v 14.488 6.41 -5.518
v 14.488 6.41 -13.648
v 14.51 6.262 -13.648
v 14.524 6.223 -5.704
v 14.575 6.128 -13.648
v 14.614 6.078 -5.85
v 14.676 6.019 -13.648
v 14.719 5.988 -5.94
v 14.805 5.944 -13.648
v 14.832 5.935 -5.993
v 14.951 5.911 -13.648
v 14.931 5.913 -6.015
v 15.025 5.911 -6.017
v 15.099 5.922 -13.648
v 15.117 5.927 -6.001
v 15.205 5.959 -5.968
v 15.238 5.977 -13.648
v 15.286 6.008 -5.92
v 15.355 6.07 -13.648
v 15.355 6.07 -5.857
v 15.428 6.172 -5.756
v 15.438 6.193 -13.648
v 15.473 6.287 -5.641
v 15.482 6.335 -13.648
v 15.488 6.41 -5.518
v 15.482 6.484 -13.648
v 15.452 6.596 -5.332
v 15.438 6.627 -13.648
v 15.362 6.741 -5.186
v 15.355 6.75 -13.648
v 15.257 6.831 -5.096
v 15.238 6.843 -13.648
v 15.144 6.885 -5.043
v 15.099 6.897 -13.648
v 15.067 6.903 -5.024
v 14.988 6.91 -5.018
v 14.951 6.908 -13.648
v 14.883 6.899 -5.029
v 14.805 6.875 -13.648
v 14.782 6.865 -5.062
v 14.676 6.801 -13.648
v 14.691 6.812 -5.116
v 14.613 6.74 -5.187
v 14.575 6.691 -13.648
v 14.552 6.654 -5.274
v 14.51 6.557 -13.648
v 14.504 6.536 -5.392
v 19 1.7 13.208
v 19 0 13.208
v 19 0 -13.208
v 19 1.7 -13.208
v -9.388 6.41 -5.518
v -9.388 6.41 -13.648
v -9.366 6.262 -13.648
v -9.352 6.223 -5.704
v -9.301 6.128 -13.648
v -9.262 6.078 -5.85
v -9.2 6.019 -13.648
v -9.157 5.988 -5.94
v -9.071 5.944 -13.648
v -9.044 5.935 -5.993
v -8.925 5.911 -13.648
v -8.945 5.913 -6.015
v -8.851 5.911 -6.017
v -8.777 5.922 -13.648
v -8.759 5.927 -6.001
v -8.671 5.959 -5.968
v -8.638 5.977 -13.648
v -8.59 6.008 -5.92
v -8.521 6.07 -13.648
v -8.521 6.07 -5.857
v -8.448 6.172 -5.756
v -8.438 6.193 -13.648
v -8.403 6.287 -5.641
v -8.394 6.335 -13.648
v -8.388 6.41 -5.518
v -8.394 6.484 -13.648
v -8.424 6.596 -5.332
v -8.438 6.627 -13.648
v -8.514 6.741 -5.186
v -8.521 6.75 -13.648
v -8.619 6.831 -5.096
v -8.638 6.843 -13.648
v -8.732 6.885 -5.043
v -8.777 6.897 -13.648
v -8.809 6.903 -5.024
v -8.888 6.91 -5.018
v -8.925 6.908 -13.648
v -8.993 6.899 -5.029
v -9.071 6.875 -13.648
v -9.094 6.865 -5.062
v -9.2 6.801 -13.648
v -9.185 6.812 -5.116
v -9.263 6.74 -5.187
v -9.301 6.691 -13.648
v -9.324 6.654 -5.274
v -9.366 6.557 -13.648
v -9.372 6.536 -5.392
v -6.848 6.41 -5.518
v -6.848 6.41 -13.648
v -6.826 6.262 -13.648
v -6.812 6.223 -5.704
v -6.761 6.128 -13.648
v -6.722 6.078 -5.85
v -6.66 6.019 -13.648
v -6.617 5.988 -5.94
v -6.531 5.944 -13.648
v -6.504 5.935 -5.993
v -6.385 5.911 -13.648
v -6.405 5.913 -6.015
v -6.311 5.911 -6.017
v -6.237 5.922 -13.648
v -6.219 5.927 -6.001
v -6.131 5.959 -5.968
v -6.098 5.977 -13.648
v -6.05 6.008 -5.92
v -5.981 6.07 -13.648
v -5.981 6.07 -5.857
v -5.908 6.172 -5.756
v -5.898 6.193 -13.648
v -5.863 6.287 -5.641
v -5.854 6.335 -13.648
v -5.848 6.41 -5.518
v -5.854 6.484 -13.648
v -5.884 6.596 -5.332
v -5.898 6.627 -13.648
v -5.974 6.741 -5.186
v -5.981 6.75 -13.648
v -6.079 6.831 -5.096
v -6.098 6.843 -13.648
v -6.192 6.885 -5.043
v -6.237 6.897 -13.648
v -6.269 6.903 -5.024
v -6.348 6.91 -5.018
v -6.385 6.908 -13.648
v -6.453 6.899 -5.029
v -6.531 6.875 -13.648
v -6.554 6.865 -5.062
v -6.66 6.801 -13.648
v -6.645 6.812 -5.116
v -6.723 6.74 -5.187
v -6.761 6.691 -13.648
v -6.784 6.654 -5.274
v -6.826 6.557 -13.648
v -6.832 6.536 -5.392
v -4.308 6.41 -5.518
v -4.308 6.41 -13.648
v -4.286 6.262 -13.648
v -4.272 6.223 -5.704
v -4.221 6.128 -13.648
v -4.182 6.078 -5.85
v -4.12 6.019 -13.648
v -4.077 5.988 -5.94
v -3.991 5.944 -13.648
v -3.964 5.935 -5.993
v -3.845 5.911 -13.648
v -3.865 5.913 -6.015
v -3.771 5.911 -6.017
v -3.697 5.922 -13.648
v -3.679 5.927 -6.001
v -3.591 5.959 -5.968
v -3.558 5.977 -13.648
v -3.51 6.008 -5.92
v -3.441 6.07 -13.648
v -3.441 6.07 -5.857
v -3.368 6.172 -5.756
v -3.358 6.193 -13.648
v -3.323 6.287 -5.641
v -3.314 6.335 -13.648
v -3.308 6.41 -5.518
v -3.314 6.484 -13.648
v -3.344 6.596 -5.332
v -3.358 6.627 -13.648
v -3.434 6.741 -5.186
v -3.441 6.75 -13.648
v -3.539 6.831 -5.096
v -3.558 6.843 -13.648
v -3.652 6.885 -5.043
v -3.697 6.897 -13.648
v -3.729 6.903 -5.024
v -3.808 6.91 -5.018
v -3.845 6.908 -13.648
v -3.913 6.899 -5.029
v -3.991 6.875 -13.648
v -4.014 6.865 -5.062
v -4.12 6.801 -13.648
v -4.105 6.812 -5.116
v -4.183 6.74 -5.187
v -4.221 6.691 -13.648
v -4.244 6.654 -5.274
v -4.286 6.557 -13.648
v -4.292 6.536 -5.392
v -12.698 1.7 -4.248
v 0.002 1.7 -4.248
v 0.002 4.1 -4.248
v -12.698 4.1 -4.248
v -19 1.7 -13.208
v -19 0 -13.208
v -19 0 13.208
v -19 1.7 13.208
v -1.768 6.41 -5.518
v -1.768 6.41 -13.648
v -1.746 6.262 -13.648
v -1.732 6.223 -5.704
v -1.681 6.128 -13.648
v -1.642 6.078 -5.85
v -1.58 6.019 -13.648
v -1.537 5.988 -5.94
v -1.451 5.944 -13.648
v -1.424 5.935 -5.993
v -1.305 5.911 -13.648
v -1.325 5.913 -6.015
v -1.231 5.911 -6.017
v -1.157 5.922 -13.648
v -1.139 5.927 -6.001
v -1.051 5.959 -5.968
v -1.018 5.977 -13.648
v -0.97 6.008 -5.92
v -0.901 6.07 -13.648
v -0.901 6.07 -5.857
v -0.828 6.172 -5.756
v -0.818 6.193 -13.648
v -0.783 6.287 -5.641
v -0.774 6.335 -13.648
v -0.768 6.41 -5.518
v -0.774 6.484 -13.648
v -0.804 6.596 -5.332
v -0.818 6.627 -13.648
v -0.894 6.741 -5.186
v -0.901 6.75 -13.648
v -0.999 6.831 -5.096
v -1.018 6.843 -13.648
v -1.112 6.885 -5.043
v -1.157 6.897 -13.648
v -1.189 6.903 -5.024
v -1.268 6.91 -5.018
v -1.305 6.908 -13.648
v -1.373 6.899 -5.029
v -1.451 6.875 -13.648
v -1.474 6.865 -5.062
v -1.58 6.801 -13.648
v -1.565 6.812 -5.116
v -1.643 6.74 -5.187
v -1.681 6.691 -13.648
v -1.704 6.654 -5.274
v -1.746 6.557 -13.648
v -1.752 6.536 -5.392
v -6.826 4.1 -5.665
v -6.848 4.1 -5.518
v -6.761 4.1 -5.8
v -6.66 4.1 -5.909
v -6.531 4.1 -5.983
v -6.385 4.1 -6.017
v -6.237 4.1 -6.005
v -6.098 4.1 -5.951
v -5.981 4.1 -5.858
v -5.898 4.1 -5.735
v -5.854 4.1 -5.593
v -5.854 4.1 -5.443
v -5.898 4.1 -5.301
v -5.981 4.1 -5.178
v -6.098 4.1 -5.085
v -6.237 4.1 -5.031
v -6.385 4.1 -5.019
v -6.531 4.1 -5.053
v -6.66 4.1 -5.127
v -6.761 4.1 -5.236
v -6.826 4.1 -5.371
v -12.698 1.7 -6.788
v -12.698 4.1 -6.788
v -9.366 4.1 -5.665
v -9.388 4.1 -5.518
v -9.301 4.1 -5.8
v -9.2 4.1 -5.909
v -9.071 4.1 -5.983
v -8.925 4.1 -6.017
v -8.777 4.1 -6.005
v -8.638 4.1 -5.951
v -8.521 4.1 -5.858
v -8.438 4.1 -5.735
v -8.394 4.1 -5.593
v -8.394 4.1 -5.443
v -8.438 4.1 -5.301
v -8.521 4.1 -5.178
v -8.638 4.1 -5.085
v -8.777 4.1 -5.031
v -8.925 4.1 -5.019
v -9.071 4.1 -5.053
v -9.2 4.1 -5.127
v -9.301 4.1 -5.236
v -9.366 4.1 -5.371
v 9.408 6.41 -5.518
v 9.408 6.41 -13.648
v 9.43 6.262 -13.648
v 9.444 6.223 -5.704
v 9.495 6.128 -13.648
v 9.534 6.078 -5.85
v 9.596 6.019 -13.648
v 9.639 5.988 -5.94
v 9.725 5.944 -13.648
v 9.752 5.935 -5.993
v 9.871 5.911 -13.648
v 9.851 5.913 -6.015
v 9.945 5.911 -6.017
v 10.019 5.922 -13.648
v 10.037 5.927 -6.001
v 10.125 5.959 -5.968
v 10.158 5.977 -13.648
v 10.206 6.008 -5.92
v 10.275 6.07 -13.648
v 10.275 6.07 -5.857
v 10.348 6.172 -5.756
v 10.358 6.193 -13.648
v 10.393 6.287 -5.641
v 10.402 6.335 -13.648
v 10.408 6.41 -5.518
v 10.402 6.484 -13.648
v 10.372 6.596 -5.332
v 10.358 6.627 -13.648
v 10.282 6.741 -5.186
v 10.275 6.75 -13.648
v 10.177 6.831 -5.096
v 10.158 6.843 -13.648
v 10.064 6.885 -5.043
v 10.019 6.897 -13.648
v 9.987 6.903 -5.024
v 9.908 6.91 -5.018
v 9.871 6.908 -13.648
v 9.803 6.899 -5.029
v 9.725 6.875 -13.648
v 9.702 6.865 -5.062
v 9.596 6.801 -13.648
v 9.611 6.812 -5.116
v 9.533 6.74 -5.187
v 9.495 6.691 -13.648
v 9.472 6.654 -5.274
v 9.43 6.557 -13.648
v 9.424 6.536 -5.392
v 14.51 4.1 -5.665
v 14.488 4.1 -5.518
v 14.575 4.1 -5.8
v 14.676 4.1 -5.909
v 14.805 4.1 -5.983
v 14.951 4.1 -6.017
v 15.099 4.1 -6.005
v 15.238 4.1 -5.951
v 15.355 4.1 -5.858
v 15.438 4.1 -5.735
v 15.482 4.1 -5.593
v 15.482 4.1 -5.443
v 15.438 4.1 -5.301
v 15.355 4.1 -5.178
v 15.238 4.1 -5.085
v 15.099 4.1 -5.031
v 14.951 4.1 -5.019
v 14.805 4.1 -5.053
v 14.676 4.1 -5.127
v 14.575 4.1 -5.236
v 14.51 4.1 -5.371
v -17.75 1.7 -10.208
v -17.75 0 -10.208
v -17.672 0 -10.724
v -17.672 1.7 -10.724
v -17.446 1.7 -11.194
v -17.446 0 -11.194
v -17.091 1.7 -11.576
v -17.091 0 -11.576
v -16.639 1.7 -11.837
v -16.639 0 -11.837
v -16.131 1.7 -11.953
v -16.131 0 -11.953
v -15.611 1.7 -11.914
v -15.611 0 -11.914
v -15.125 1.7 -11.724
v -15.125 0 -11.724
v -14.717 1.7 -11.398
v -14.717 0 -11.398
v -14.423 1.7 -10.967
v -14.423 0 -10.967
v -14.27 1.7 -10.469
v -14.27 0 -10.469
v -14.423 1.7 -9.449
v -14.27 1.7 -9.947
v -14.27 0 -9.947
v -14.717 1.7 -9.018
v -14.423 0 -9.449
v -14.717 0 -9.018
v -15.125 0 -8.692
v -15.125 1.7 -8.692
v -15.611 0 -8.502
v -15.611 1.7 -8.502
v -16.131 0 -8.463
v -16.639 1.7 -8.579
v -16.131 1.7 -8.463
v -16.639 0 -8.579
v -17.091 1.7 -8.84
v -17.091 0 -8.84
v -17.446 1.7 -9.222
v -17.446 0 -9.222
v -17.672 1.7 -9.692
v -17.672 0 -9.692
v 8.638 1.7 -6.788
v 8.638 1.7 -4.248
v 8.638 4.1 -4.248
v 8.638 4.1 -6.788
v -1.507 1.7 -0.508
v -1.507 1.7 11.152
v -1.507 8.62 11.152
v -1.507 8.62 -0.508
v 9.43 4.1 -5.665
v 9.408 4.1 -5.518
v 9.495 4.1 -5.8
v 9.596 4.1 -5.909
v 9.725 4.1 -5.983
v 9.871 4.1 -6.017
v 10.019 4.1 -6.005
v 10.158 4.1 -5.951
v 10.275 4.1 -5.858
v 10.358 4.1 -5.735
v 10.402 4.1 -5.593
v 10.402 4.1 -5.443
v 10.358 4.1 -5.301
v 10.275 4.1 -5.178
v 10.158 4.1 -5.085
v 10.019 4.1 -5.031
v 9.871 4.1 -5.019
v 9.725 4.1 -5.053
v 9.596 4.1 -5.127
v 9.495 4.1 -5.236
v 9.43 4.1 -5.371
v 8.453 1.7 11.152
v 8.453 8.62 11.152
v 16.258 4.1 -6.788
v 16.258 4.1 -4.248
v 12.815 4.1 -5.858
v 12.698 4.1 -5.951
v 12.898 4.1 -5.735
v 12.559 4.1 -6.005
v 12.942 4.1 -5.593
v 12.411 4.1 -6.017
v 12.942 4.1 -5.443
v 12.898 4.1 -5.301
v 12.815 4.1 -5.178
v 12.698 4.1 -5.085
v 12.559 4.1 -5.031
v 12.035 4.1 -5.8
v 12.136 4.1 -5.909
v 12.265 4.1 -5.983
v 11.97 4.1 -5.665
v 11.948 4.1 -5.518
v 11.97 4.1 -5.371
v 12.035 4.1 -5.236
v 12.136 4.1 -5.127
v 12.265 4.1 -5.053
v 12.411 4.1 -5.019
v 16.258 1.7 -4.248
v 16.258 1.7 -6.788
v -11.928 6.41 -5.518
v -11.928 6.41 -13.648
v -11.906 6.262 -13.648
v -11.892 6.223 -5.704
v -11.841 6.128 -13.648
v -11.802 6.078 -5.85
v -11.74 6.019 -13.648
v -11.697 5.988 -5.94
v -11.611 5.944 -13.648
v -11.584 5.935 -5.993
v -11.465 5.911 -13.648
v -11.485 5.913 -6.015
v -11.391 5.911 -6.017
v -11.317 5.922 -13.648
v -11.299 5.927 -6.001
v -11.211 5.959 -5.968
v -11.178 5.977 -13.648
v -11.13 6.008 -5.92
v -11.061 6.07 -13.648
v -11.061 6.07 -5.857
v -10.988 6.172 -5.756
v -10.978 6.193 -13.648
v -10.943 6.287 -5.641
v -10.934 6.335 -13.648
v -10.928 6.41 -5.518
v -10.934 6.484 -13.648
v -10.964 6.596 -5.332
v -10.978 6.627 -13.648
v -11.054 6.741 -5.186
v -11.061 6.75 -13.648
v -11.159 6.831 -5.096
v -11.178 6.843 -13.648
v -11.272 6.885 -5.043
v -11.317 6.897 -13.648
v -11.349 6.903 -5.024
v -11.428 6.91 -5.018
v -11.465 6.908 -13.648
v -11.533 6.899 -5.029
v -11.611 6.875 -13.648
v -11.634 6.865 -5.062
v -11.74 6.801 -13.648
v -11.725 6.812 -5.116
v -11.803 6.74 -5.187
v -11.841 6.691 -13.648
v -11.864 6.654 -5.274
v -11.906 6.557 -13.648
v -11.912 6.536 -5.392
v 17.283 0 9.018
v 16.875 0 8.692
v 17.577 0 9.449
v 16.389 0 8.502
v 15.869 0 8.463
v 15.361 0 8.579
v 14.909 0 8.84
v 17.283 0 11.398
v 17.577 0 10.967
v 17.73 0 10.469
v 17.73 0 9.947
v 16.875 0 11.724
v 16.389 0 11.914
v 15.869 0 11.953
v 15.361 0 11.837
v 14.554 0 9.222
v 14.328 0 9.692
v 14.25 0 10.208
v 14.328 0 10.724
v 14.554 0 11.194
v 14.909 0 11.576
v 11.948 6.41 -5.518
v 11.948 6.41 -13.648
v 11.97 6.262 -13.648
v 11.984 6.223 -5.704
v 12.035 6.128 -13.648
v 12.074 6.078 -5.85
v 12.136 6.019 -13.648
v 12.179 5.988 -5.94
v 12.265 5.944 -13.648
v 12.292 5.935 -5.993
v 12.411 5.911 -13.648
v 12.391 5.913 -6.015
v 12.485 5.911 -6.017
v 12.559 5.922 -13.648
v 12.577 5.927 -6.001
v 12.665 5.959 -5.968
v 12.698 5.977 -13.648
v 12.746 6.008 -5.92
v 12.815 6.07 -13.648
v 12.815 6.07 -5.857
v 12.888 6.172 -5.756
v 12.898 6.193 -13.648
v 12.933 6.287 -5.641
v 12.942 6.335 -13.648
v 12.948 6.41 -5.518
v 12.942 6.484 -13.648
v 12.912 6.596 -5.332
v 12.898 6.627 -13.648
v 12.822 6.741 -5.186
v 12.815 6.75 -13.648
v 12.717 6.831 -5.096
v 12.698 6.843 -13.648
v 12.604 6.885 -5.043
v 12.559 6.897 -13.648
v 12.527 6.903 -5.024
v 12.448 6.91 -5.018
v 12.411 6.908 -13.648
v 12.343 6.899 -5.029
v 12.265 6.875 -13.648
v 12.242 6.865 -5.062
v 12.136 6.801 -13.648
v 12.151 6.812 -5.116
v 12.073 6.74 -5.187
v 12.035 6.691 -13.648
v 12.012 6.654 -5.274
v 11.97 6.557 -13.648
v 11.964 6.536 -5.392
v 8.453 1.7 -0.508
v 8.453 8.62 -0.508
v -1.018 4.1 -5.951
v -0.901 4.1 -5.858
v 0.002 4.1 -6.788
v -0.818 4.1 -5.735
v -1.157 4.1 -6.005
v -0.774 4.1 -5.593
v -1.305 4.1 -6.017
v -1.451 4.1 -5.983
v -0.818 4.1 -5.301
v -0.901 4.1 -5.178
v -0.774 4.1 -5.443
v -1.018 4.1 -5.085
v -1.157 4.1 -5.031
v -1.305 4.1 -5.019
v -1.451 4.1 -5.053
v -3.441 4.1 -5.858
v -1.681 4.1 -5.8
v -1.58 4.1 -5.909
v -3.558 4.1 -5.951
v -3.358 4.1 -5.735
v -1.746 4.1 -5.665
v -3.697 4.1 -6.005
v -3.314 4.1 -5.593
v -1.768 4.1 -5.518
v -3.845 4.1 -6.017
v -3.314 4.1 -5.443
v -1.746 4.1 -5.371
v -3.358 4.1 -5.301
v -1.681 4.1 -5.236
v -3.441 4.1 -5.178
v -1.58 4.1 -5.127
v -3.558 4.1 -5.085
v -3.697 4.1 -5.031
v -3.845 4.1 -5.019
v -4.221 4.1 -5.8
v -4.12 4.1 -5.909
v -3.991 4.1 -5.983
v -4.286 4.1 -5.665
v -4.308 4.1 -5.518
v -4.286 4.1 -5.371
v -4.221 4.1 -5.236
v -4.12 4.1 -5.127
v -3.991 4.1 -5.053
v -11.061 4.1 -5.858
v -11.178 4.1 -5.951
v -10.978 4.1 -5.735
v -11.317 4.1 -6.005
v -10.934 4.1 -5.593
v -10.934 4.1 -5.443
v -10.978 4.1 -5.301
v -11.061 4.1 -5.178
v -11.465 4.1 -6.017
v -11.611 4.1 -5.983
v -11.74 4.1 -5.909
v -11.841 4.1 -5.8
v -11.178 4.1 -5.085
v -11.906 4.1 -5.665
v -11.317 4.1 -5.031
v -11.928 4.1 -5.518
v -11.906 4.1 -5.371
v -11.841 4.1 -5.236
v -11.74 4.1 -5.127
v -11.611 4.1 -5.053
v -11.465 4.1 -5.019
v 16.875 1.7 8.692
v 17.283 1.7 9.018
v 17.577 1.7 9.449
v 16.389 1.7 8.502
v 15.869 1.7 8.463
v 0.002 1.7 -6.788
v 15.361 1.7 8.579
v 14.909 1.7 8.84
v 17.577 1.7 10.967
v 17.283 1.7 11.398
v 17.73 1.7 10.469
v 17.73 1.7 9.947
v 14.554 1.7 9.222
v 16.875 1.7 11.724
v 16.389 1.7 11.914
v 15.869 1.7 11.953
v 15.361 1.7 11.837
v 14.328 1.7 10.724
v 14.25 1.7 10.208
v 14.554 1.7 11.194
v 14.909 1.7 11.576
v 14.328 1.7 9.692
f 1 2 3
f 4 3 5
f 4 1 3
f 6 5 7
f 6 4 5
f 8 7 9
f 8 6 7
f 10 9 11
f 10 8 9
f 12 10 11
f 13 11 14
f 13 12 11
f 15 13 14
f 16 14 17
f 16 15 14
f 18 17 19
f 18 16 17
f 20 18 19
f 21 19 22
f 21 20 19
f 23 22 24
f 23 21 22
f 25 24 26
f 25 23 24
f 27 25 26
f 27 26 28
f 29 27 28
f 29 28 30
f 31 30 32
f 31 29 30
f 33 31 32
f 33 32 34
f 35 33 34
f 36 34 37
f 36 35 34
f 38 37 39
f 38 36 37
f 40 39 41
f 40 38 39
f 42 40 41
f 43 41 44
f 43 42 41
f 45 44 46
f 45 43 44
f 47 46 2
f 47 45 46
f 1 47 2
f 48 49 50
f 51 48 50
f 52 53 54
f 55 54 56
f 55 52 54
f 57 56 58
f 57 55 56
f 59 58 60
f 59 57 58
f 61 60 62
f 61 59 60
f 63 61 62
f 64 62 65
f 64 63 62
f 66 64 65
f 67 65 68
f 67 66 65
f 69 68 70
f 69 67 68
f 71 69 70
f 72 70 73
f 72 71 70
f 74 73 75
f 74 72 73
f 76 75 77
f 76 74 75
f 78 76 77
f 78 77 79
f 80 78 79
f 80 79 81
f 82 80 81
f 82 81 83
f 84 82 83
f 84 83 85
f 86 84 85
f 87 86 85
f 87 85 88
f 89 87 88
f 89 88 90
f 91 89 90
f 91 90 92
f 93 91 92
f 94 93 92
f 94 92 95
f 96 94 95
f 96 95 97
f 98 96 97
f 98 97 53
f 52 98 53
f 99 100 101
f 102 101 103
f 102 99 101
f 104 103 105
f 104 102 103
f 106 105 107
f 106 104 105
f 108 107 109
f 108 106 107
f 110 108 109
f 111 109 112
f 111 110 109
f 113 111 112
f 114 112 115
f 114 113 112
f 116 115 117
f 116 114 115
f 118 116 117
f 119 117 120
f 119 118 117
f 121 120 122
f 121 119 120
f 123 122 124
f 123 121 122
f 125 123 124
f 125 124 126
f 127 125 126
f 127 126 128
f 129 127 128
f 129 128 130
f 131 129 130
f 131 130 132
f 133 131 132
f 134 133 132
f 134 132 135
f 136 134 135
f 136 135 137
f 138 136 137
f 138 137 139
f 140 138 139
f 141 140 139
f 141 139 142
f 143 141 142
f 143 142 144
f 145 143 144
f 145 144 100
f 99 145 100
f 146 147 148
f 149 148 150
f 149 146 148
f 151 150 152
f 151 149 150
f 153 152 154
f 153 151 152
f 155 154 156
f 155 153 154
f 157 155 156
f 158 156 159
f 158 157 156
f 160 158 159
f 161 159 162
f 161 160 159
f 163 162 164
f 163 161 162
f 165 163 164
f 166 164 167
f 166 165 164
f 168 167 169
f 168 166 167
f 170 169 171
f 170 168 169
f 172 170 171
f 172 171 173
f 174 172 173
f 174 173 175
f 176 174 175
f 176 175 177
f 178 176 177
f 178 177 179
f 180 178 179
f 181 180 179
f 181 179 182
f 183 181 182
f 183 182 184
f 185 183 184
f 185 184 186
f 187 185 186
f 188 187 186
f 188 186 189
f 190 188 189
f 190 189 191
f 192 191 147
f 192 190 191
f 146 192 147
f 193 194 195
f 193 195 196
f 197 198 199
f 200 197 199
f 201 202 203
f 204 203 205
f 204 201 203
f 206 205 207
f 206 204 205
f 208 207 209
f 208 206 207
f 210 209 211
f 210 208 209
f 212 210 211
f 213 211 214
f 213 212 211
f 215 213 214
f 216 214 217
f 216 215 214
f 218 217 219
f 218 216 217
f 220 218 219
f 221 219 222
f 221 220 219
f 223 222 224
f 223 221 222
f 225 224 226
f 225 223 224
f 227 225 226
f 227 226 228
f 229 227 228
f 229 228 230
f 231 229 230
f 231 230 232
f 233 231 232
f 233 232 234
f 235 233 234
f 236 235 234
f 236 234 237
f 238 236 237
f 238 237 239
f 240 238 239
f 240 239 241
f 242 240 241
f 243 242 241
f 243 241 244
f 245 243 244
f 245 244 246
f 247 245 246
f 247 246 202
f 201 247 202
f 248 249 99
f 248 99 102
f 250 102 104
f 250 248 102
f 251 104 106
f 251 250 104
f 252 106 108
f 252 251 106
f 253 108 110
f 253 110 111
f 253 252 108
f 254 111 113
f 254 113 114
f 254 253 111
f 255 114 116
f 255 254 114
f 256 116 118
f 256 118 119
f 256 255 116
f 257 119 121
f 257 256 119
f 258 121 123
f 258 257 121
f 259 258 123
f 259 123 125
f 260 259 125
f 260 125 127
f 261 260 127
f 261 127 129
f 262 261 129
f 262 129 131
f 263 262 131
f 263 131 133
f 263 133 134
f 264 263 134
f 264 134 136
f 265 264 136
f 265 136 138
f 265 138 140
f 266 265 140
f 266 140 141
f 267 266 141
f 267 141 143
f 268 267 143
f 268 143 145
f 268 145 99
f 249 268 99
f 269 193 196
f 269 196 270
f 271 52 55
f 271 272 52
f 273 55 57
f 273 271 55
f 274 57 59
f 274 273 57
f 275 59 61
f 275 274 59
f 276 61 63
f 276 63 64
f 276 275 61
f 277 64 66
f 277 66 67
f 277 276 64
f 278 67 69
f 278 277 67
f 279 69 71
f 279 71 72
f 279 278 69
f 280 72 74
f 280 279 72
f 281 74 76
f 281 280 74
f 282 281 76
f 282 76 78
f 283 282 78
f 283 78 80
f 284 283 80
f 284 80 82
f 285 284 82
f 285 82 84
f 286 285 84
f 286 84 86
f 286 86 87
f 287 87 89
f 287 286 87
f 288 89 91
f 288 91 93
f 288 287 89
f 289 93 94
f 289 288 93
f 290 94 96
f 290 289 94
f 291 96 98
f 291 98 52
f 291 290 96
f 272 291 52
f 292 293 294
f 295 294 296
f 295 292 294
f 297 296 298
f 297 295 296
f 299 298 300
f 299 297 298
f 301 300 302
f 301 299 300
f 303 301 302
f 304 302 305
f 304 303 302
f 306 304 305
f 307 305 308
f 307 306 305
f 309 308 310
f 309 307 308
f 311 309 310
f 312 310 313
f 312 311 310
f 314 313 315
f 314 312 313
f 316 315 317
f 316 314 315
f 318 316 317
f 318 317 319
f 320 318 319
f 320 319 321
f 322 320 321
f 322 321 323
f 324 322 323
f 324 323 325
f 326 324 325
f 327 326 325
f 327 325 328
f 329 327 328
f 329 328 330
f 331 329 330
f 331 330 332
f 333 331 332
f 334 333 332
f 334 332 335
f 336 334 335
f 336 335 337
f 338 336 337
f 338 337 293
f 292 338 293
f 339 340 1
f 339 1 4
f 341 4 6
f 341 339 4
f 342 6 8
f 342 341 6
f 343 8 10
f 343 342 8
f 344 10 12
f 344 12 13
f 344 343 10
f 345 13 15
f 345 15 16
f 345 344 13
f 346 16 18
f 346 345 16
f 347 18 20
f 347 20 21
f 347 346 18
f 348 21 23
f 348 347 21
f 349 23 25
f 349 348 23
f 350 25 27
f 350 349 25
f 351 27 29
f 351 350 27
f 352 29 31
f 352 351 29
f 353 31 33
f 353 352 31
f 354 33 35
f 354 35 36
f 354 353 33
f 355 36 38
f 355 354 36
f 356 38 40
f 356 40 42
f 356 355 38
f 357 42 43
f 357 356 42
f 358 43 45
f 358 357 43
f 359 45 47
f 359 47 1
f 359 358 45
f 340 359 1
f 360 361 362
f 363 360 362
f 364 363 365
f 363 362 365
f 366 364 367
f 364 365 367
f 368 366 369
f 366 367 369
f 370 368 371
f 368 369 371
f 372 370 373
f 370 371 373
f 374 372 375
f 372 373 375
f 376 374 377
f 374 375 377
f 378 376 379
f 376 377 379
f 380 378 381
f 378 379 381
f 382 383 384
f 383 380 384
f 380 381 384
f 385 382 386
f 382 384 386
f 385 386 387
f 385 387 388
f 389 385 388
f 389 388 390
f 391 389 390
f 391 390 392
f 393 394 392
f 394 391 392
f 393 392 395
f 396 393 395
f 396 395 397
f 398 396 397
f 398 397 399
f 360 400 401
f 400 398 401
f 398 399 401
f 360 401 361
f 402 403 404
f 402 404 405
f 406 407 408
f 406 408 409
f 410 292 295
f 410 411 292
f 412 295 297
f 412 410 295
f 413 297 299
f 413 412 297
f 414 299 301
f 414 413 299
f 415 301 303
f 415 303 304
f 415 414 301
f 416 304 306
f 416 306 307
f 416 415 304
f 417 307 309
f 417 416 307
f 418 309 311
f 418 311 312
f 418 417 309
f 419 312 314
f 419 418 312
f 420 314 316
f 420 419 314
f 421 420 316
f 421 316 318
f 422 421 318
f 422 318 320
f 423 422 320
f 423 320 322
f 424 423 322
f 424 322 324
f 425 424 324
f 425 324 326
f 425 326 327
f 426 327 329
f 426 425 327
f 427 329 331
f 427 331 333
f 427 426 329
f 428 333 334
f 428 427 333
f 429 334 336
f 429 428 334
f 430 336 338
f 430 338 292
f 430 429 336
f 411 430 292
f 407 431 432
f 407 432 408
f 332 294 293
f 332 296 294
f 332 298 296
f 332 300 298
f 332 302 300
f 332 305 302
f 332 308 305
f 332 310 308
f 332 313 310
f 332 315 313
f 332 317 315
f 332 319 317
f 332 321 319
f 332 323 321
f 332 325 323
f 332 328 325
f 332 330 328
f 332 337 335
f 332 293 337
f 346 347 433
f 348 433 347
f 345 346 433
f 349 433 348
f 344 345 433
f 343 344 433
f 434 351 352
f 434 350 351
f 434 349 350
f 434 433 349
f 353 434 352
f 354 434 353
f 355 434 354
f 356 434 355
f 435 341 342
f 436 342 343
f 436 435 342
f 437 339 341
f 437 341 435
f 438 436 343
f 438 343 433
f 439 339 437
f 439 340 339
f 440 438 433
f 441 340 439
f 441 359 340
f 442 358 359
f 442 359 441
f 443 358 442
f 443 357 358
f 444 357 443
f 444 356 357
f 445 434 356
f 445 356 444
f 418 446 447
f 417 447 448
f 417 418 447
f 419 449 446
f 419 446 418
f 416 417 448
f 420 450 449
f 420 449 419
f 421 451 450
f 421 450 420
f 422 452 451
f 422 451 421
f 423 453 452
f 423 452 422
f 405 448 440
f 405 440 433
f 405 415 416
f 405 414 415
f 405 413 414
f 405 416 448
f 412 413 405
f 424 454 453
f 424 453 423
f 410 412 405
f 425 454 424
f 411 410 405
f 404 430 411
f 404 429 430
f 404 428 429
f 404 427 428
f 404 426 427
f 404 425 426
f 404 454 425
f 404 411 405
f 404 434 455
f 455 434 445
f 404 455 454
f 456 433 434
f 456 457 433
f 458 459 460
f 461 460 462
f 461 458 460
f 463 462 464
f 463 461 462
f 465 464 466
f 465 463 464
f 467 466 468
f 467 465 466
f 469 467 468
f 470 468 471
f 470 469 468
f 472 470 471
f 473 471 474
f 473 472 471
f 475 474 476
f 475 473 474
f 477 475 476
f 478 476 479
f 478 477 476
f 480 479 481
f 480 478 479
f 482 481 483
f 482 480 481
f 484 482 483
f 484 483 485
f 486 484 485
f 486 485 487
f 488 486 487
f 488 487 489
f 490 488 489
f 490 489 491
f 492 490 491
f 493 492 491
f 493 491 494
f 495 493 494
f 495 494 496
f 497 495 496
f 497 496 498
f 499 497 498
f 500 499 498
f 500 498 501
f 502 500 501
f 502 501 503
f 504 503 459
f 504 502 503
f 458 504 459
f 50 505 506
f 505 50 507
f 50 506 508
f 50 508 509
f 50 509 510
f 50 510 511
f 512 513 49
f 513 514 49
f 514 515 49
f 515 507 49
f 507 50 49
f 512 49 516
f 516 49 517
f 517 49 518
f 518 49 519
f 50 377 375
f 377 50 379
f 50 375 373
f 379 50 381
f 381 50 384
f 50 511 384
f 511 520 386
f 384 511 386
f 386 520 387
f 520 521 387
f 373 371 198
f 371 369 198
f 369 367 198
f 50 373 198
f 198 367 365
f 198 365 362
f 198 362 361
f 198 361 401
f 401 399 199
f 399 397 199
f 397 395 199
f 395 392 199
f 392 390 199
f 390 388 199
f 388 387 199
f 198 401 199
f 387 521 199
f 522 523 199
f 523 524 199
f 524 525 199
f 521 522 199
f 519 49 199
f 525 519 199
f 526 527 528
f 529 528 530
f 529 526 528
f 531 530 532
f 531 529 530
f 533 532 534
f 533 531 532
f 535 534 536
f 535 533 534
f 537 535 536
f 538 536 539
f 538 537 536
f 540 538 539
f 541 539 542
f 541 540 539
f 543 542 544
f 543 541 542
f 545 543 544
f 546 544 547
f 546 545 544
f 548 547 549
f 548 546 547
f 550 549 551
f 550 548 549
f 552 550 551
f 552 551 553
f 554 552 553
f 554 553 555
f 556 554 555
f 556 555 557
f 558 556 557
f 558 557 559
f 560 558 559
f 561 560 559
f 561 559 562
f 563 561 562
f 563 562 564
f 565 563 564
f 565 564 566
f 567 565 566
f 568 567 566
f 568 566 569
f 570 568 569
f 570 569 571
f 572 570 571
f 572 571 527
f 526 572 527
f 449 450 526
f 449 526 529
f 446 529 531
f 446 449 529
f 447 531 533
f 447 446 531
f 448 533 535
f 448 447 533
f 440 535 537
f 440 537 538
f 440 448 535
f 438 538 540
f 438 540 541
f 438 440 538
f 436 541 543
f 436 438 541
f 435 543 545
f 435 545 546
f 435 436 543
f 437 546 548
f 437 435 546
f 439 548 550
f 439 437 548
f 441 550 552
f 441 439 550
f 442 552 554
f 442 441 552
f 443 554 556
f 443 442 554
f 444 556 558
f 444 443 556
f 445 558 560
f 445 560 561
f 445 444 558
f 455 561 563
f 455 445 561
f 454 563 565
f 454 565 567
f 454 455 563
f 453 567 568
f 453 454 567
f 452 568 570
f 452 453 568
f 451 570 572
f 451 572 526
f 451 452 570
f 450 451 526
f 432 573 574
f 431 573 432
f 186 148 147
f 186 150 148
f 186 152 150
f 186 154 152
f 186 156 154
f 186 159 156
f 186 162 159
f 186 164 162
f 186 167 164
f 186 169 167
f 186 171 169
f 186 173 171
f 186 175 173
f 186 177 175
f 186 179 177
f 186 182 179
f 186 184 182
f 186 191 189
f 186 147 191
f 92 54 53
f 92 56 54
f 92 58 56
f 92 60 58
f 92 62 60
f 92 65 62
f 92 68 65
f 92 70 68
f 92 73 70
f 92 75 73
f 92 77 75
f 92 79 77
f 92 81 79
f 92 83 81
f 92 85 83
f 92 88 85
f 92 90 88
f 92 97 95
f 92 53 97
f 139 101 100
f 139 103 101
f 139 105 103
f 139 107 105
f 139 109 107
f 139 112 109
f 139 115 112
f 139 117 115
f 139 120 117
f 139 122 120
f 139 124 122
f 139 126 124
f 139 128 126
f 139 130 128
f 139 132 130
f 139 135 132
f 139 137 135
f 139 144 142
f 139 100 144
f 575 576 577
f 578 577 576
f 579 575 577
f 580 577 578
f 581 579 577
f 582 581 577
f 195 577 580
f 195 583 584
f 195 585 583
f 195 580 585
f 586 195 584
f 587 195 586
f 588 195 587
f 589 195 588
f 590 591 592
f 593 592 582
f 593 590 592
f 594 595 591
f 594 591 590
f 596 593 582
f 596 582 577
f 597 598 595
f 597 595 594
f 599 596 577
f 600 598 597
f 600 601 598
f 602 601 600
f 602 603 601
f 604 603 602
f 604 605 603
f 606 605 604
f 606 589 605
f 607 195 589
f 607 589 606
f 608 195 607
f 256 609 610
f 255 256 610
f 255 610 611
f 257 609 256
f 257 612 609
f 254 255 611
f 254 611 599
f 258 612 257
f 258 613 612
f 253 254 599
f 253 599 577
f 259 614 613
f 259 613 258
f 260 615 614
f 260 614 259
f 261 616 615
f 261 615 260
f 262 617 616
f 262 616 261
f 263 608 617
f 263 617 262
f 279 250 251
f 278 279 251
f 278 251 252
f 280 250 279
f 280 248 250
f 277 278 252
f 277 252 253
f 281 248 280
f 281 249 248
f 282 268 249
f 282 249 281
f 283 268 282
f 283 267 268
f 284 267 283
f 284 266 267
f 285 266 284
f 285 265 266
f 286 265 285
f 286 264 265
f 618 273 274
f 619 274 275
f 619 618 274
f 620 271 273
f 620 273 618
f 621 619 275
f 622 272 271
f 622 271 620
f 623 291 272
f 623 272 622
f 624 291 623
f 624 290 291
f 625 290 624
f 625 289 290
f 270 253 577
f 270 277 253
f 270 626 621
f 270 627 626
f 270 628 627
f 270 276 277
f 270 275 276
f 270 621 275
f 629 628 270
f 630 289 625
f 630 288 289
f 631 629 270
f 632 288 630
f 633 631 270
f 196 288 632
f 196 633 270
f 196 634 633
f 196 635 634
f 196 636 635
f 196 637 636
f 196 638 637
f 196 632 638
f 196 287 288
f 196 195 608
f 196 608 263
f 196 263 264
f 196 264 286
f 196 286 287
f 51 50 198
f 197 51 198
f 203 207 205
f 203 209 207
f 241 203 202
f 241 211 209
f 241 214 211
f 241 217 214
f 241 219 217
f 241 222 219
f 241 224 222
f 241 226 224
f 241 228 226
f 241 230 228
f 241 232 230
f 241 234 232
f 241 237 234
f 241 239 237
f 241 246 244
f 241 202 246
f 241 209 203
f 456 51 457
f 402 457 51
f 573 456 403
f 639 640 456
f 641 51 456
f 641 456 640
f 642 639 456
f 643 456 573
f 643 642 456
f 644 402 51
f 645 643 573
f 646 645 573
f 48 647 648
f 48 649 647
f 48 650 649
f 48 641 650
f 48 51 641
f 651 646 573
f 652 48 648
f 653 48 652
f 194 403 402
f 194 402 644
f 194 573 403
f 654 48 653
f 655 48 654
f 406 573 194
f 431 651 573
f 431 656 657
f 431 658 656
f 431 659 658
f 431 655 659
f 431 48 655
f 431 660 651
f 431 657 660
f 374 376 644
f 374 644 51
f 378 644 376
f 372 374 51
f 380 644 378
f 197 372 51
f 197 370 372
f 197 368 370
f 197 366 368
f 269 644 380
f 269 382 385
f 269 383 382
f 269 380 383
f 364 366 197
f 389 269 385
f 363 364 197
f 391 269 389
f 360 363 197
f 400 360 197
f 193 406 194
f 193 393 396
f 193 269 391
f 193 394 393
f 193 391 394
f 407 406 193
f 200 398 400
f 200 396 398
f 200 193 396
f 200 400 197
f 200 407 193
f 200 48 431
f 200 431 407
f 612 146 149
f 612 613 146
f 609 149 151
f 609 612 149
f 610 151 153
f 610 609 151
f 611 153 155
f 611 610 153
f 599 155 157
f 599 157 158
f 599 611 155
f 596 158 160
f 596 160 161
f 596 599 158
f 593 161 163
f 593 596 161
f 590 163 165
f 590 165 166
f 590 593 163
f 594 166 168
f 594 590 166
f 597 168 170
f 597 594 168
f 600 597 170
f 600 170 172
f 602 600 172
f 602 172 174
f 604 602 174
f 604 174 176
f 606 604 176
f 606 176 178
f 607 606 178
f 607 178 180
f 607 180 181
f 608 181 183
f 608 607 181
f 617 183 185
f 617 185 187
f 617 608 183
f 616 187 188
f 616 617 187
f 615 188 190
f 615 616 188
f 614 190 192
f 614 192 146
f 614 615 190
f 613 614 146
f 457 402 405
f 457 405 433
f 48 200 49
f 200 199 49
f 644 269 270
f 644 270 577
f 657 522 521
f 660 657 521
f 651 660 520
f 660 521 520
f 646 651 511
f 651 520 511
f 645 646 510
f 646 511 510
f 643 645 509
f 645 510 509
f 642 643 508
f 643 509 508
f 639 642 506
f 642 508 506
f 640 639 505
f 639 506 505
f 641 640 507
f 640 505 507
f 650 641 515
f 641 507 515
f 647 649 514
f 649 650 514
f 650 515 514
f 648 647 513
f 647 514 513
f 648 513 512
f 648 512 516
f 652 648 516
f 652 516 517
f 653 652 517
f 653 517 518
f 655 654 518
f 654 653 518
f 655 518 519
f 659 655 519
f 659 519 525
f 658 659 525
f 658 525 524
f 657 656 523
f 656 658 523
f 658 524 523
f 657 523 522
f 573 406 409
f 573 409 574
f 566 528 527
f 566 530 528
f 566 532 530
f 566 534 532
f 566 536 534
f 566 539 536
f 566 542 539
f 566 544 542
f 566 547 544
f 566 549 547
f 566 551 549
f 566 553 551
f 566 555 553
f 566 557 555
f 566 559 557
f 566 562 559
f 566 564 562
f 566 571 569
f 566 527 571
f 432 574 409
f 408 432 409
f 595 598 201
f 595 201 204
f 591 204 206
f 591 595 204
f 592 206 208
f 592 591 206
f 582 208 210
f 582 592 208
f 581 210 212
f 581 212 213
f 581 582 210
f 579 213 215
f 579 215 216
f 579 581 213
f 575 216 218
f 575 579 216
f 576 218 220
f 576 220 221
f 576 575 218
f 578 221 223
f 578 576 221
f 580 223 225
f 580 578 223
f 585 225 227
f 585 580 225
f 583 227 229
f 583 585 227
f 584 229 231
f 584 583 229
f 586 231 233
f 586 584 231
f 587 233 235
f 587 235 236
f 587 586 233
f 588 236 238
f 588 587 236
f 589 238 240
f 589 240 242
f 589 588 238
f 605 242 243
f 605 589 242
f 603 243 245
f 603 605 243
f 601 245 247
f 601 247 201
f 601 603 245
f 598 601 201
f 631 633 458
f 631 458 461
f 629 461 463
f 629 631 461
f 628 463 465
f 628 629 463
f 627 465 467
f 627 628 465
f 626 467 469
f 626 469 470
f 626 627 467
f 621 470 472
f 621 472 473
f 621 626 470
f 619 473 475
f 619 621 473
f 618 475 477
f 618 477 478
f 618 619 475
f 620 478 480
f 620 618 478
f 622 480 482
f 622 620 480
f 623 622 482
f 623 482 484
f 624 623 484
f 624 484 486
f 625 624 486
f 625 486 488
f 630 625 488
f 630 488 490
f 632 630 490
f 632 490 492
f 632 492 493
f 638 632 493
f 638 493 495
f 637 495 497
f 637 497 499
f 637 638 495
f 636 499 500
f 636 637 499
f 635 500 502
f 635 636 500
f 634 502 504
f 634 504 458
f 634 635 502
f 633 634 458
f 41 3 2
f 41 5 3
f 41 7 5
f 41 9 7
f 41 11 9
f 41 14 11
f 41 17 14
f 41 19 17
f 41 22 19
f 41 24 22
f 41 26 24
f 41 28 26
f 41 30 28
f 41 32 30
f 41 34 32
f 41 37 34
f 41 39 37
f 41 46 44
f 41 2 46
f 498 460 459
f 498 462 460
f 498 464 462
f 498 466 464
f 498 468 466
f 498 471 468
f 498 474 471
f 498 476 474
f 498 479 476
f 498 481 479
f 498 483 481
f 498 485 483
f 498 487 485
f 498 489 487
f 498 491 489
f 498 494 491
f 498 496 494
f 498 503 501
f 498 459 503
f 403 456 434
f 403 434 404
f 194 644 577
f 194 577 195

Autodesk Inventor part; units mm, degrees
ref_plane "YZ Plane" through (0, 0, 0) normal (1, 0, 0) x (0, 1, 0)
ref_plane "XZ Plane" through (0, 0, 0) normal (0, 1, 0) x (-1, 0, 0)
ref_plane "XY Plane" through (0, 0, 0) normal (0, 0, 1) x (1, 0, 0)
sketch "Sketch1" plane through (0, 0, 0) normal (0, 1, 0) x (-1, 0, 0)
  line L0 (19, 13.208) -> (-19, 13.208)
  line L1 (-19, 13.208) -> (-19, -13.208)
  line L2 (-19, -13.208) -> (19, -13.208)
  line L3 (19, -13.208) -> (19, 13.208)
  line L4 (19, 13.208) -> (-19, -13.208) construction
  line L5 (-19, 13.208) -> (19, -13.208) construction
  circle A0 centre (16, -10.208) radius 1.75
  circle A1 centre (-16, 10.208) radius 1.75
  circle A2 centre (11.428, -5.518) radius 0.5
  circle A3 centre (8.888, -5.518) radius 0.5
  circle A4 centre (6.348, -5.518) radius 0.5
  circle A5 centre (3.808, -5.518) radius 0.5
  circle A6 centre (1.268, -5.518) radius 0.5
  line L6 (12.698, -6.788) -> (-0.002, -6.788)
  line L7 (-0.002, -6.788) -> (-0.002, -4.248)
  line L8 (-0.002, -4.248) -> (12.698, -4.248)
  line L9 (12.698, -4.248) -> (12.698, -6.788)
  circle A7 centre (-9.908, -5.518) radius 0.5
  circle A8 centre (-12.448, -5.518) radius 0.5
  circle A9 centre (-14.988, -5.518) radius 0.5
  line L10 (-8.638, -6.788) -> (-16.258, -6.788)
  line L11 (-16.258, -6.788) -> (-16.258, -4.248)
  line L12 (-16.258, -4.248) -> (-8.638, -4.248)
  line L13 (-8.638, -4.248) -> (-8.638, -6.788)
  line L14 (1.5071, -0.508) -> (-8.4529, -0.508)
  line L15 (-8.4529, -0.508) -> (-8.4529, 11.152)
  line L16 (-8.4529, 11.152) -> (1.5071, 11.152)
  line L17 (1.5071, 11.152) -> (1.5071, -0.508)
  point P0 (0, 0)
  dimension "d0" = 38
  dimension "d1" = 26.416
  dimension "d2" = 3.5
  dimension "d3" = 3.5
  dimension "d4" = 3
  dimension "d5" = 3
  dimension "d6" = 3
  dimension "d7" = 3
  dimension "d8" = 1
  dimension "d9" = 4.572
  dimension "d10" = 4.69
  dimension "d13" = 2.54
  dimension "d18" = 1.27
  dimension "d19" = 1.27
  dimension "d20" = 1.27
  dimension "d21" = 1.27
  dimension "d22" = 1
  dimension "d23" = 11.176
  dimension "d26" = 2.54
  dimension "d31" = 1.27
  dimension "d33" = 1.27
  dimension "d34" = 9.96
  dimension "d35" = 11.66
  dimension "d36" = 3.74
extrude "Extrusion1" add sketch "Sketch1" along normal blind 1.7 contours L3 L2 L1 L0
extrude "Extrusion2" add sketch "Sketch1" along normal blind 8.62 contours L14 L15 L16 L17
extrude "Extrusion3" add sketch "Sketch1" along normal blind 4.1 contours L6 L7 L8 L9 | L10 L11 L12 L13
sketch "Sketch2" plane through (19, 0, 13.208) normal (1, 0, 0) x (0, 0, -1)
  line L0 (18.9857, 6.15) -> (26.8557, 6.15)
  line L1 (0, 0) -> (26.416, 0) projected
  line L2 (18.9857, 6.15) -> (18.9857, 0)
  point P0 (13.208, 0)
  dimension "d43" = 6.15
  dimension "d44" = 7.87
sweep "Sweep1" add profiles "Sketch1" path "Sketch2" path curves L2 L0 contours A2 | A3 | A4 | A5 | A6 | A7 | A8 | A9
sketch "Sketch3" plane through (0, 1.7, 0) normal (0, 1, 0) x (1, 0, 0)
  line L0 (-13.5449, 4.016) -> (19.3166, 4.016) construction
  line L1 (19.3166, 4.016) -> (19.3166, 0.2862) construction
  line L2 (19.3166, 0.2862) -> (-13.5449, 0.2862) construction
  line L3 (-13.5449, 0.2862) -> (-13.5449, 4.016) construction
  point P0 (0, 0)
properties part number "modestmard"
